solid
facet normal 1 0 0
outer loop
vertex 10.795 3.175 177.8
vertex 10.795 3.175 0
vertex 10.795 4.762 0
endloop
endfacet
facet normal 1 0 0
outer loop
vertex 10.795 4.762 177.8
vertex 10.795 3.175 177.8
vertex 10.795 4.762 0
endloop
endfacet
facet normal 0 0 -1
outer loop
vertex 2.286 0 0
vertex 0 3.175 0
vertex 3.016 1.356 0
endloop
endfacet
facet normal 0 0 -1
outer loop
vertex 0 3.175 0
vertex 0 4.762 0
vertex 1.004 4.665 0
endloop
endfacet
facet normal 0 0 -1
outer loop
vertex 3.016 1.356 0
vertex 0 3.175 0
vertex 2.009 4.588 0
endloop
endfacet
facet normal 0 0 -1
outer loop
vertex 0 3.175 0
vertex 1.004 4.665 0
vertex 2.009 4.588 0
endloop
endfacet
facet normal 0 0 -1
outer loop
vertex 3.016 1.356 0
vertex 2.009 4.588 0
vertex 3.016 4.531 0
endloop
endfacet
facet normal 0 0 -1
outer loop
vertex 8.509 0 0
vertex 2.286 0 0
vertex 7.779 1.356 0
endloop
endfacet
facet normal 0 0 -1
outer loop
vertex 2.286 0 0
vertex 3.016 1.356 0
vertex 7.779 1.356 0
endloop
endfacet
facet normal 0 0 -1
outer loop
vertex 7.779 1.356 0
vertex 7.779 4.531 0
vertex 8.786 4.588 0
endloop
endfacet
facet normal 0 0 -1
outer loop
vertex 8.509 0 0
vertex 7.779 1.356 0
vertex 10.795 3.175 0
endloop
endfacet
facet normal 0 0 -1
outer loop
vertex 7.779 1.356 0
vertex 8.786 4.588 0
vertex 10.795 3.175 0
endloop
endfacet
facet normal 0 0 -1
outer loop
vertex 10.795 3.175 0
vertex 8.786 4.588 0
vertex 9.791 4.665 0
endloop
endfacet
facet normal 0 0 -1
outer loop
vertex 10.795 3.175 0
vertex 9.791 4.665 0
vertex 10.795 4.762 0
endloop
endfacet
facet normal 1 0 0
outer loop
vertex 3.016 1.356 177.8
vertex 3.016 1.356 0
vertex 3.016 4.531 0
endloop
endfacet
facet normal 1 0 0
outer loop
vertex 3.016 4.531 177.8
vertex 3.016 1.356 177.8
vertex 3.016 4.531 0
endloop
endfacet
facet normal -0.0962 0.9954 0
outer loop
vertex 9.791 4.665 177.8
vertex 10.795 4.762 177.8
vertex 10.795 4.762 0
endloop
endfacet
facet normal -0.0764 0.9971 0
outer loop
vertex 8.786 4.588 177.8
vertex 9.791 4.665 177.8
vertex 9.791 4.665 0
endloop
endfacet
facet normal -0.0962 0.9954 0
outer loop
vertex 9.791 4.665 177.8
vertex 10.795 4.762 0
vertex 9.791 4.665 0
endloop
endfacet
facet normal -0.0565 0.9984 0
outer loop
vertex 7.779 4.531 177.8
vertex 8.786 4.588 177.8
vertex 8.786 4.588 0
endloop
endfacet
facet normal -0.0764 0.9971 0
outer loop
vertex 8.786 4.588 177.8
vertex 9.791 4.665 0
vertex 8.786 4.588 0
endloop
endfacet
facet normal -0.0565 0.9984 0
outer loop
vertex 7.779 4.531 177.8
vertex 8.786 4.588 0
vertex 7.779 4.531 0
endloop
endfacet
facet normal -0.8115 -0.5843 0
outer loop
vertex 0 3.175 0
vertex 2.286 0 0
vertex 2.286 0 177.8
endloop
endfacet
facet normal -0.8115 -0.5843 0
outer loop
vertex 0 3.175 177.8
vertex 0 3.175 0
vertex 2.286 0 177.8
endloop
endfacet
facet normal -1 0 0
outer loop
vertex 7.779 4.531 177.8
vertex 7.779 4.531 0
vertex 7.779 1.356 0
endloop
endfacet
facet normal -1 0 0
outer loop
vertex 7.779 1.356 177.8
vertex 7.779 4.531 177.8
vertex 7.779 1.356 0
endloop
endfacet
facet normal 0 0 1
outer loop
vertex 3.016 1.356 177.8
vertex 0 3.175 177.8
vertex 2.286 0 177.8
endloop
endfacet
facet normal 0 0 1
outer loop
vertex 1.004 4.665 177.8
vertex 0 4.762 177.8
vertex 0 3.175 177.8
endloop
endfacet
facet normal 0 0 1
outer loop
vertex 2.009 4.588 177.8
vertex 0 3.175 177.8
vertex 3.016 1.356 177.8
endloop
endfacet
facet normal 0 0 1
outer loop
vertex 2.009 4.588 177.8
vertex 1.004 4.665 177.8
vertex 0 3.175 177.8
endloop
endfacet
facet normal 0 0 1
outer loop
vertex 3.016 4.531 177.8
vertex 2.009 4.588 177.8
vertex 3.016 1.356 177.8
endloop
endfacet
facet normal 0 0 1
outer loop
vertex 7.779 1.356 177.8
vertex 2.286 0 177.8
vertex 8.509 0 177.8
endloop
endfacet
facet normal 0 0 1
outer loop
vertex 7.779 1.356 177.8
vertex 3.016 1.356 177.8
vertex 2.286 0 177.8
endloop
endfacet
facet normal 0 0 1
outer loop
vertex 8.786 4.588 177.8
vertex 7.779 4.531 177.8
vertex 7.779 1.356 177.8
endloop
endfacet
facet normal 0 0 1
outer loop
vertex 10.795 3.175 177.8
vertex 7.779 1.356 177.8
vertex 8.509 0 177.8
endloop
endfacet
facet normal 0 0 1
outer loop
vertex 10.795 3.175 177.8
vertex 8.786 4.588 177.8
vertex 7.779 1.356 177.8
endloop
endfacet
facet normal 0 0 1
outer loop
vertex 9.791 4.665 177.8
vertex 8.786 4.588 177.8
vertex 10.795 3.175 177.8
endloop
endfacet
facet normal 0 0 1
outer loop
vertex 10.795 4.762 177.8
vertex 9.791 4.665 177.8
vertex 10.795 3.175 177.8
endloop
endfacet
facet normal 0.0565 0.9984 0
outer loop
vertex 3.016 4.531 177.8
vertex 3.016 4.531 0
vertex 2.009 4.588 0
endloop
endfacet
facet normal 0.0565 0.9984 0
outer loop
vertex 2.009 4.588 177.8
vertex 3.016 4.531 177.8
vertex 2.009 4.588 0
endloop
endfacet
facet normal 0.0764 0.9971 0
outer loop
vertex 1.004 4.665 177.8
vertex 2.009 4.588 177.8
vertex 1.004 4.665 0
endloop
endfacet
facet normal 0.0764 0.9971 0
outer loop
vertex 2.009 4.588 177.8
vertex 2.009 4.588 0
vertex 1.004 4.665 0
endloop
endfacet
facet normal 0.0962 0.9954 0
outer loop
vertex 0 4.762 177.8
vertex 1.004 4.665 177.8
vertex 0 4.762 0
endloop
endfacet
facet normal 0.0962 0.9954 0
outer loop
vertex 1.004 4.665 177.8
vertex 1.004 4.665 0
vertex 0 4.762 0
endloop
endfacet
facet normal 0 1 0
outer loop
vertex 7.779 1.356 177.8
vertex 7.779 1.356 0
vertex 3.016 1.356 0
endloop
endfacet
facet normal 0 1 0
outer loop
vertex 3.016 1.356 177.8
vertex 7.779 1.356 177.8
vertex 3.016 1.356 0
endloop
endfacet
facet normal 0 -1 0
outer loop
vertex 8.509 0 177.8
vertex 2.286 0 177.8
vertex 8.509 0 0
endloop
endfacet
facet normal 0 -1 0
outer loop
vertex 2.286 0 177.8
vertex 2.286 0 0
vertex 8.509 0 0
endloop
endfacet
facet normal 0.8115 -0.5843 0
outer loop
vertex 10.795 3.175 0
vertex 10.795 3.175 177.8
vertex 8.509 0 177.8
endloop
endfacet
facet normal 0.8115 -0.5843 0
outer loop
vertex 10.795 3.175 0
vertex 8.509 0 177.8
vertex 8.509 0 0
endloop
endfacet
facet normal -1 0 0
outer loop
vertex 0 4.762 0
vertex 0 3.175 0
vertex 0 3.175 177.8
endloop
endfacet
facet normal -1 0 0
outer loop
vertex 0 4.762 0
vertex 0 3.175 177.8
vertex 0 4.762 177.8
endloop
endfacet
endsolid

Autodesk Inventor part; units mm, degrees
ref_plane "YZ Plane" through (0, 0, 0) normal (1, 0, 0) x (0, 1, 0)
ref_plane "XZ Plane" through (0, 0, 0) normal (0, 1, 0) x (-1, 0, 0)
ref_plane "XY Plane" through (0, 0, 0) normal (0, 0, 1) x (1, 0, 0)
sketch "Sketch1" plane through (0, 0, 0) normal (0, 0, 1) x (1, 0, 0)
  line L0 (0, 0) -> (10.795, 0)
  line L1 (10.795, 0) -> (10.795, 4.7625)
  line L2 (0, 0) -> (0, 4.7625)
  arc A0 (0, 4.7625) -> (10.795, 4.7625) centre (5.3975, 55.2749) ccw
  dimension "d0" = 50.8
  dimension "d1" = 10.795
  dimension "d2" = 4.7625
extrude "Extrusion1" add sketch "Sketch1" along normal blind 177.8
sketch "Sketch2" plane through (0, 0, 177.8) normal (0, 0, 1) x (1, 0, 0)
  arc A0 (0, 4.7625) -> (10.795, 4.7625) centre (5.3975, 55.2749) ccw projected
  line L0 (3.0162, 4.5308) -> (7.7787, 4.5308)
  line L1 (7.7787, 4.5308) -> (7.7787, 1.3558)
  line L2 (7.7787, 1.3558) -> (3.0162, 1.3558)
  line L3 (3.0162, 1.3558) -> (3.0162, 4.5308)
  point P0 (0, 0)
  point P1 (5.3975, 4.5308)
  point P2 (5.3975, 4.4749)
  dimension "d5" = 4.7625
  dimension "d6" = 3.175
extrude "Extrusion2" cut sketch "Sketch2" against normal through all contours A0 L1 L2 L3
chamfer "Chamfer2" distance 3.175 distance2 2.286 1 edges at (0, 0, 88.9) measured on face at (0, 3.175, 118.5333)
chamfer "Chamfer3" distance 2.286 distance2 3.175 1 edges at (10.795, 0, 88.9) measured on face at (5.1223, 0, 59.2667)
properties part number "WireGuideToMiniSub" material "ABS Plastic"
